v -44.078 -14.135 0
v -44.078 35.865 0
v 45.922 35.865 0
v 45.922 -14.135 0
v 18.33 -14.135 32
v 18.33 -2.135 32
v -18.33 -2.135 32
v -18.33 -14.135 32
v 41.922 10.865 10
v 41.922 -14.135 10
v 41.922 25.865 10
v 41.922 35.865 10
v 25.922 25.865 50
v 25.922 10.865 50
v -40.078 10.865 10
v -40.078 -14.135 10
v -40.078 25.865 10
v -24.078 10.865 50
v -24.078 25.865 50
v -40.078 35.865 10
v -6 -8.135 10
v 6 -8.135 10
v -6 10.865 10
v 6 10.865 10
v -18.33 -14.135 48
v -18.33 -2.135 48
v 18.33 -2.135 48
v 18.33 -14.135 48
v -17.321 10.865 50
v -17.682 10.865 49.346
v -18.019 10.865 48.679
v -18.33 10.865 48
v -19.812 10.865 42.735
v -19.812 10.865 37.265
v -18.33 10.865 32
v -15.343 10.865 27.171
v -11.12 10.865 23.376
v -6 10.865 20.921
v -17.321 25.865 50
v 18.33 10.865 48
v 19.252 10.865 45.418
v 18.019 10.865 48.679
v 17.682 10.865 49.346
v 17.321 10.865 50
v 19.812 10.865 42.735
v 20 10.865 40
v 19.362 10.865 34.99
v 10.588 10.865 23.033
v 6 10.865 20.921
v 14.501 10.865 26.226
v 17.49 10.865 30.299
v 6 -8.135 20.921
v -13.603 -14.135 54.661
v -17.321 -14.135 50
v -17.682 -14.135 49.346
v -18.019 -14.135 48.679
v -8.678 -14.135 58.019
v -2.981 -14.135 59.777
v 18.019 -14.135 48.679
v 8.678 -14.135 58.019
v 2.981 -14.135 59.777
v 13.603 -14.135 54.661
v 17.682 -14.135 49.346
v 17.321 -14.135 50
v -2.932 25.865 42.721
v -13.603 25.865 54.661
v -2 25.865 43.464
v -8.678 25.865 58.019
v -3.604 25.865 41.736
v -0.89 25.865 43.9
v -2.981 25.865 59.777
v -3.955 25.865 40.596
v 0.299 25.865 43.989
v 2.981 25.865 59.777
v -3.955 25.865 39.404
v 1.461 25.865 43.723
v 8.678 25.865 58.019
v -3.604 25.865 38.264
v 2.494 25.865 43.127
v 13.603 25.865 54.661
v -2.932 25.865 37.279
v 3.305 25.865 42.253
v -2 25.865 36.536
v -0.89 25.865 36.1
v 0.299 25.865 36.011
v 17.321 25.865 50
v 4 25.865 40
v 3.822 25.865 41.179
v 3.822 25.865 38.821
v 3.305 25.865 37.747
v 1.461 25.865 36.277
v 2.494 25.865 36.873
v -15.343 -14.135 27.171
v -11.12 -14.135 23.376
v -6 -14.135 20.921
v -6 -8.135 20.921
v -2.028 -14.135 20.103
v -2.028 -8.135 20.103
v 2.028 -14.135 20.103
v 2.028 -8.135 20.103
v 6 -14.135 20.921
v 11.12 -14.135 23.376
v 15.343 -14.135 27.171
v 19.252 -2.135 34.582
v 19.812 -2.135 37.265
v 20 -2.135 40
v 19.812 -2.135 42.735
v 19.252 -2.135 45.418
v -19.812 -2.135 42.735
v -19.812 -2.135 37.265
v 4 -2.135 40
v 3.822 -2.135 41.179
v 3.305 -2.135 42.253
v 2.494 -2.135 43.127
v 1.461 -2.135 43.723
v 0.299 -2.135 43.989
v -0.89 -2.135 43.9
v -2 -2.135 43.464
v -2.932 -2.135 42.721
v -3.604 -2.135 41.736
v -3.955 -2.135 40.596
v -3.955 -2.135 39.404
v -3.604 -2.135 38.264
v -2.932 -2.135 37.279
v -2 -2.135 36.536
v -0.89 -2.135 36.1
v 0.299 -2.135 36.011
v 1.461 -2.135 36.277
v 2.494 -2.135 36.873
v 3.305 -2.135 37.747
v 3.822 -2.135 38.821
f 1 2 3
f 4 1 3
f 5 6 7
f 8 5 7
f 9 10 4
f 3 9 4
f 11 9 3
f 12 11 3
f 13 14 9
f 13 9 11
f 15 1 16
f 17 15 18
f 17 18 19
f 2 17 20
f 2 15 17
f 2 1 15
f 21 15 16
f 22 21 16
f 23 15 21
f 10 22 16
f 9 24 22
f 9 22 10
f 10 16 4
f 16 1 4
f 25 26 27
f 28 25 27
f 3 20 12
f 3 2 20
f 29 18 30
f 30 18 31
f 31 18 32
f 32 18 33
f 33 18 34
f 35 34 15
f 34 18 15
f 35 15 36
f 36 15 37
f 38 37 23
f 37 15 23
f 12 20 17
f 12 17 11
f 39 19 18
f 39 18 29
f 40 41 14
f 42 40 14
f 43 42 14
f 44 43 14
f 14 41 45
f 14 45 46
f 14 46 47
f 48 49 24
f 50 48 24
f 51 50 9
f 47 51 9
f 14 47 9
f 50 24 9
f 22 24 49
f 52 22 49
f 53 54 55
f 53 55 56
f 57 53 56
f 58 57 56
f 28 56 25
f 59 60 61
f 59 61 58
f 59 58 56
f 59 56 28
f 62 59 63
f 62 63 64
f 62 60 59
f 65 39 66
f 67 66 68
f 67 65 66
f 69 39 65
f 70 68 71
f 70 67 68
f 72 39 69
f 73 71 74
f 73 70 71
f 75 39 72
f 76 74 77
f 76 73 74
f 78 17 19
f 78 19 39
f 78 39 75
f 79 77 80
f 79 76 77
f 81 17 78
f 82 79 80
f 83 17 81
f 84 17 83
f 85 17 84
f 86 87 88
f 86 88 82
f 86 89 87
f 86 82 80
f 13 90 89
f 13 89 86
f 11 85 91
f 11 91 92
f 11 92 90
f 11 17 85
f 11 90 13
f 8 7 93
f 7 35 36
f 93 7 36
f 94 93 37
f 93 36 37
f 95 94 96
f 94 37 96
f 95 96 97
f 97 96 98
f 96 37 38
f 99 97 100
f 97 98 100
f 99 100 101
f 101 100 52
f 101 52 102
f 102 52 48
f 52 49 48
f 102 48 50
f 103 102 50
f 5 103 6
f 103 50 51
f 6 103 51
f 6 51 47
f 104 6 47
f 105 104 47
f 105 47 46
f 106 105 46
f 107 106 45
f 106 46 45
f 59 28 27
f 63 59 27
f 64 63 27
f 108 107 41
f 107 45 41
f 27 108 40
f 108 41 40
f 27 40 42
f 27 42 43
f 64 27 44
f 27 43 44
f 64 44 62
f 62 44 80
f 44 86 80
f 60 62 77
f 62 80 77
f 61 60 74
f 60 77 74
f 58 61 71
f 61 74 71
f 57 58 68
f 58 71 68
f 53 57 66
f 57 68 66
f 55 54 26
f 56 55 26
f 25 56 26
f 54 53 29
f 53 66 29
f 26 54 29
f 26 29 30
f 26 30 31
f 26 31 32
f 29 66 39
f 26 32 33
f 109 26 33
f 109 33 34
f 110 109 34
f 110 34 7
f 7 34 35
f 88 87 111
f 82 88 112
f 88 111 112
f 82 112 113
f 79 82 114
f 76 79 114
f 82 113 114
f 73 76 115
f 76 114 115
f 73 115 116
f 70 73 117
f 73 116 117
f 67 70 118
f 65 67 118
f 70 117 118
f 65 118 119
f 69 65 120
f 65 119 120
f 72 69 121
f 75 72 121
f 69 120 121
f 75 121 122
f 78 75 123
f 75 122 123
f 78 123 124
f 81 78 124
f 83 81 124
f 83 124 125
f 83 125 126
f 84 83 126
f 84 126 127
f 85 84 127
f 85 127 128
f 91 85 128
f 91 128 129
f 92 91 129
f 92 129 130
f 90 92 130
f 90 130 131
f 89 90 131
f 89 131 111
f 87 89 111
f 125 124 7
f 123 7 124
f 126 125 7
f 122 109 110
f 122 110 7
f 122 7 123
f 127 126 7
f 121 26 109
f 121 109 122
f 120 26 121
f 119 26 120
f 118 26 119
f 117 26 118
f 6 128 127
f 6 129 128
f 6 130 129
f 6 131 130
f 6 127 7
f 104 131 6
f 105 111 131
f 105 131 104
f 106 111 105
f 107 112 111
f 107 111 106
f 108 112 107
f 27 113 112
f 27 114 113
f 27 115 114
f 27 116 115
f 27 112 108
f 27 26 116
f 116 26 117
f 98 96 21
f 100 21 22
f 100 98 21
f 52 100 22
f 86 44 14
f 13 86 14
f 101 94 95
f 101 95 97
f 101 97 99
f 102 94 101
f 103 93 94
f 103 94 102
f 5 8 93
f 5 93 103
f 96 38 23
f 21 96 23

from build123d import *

# Parameters (mm, degrees)
F0_W      = 90
F0_H      = 50
F1_DEPTH  = 10
F2_W      = 90
F2_H      = 15
F3_DEPTH  = 40
F4_SIZE2  = 49.99999
F4_SIZE   = 19.99999
F5_SIZE2  = 19.99999
F5_SIZE   = 49.99999
F7_DEPTH  = 25
F8_DEPTH  = 15
F9_DEPTH  = 13
F10_DEPTH = 19
F11_R     = 4
F12_DEPTH = 40


# Not quite as in the source:
# - a fillet or chamfer is up to 0.001 mm smaller than in the source, because OpenCascade refuses the exact size


with BuildPart() as f1:
    # F0 (on Top) → F1 (new body)
    with BuildSketch(Plane.XY):
        with Locations((0.9217737243, 10.8652876893)):
            Rectangle(F0_W, F0_H)
    extrude(amount=F1_DEPTH)

    # F2 (on face) → F3 (join)
    with BuildSketch(Plane.XY.offset(10)):
        with Locations((0.9217737243, 18.3652876893)):
            Rectangle(F2_W, F2_H)
    extrude(amount=F3_DEPTH)

    # F4 (size 20 and 50 in the source; OpenCascade refuses exactly that, so slightly less here)
    f4_edges = [f1.edges().sort_by_distance(p)[0] for p in [
        (-44.078226, 18.365288, 50),
    ]]
    f4_side = f1.faces().sort_by_distance((0.921774, 18.365288, 50))[0]
    chamfer(f4_edges, length=F4_SIZE, length2=F4_SIZE2, reference=f4_side)

    # F5 (size 50 and 20 in the source; OpenCascade refuses exactly that, so slightly less here)
    f5_edges = [f1.edges().sort_by_distance(p)[0] for p in [
        (45.921774, 18.365288, 50),
    ]]
    f5_side = f1.faces().sort_by_distance((45.921774, 14.956197, 18.636364))[0]
    chamfer(f5_edges, length=F5_SIZE, length2=F5_SIZE2, reference=f5_side)

    # F6 (on face) → F7 (join)
    with BuildSketch(Plane.XZ.offset(-10.8652876893)):
        with BuildLine():
            Line((-17.3205080757, 50), (17.3205080757, 50))
            ThreePointArc((17.3205080757, 50), (0, 60), (-17.3205080757, 50))
        make_face()
        with BuildLine():
            Line((-18.3303027798, 48), (18.3303027798, 48))
            ThreePointArc((18.3303027798, 48), (17.8534332458, 49.0141511711), (17.3205080757, 50))
            Line((17.3205080757, 50), (-17.3205080757, 50))
            ThreePointArc((-17.3205080757, 50), (-17.8534332458, 49.0141511711), (-18.3303027798, 48))
        make_face()
        with BuildLine():
            ThreePointArc((6, 20.9212159717), (13.3669657075, 25.1230302893), (18.3303027798, 32))
            Line((18.3303027798, 32), (-18.3303027798, 32))
            ThreePointArc((-18.3303027798, 32), (-13.3669657075, 25.1230302893), (-6, 20.9212159717))
            ThreePointArc((-6, 20.9212159717), (0, 20), (6, 20.9212159717))
        make_face()
    extrude(amount=F7_DEPTH)

    # F8 (add): a face of the model
    f8_faces = [f1.faces().sort_by_distance(p)[0] for p in [
        (0, 10.8652876893, 54.100403238),
    ]]
    extrude(f8_faces, amount=F8_DEPTH)

    # F6 (on face) → F9 (join)
    with BuildSketch(Plane.XZ.offset(-10.8652876893)):
        with BuildLine():
            ThreePointArc((18.3303027798, 32), (19.5781262586, 35.9138071262), (20, 40))
            ThreePointArc((20, 40), (19.5781262586, 44.0861928738), (18.3303027798, 48))
            Line((18.3303027798, 48), (-18.3303027798, 48))
            ThreePointArc((-18.3303027798, 48), (-20, 40), (-18.3303027798, 32))
            Line((-18.3303027798, 32), (18.3303027798, 32))
        make_face()
    extrude(amount=F9_DEPTH)

    # F6 (on face) → F10 (join)
    with BuildSketch(Plane.XZ.offset(-10.8652876893)):
        with BuildLine():
            Line((6, 10), (6, 20.9212159717))
            ThreePointArc((6, 20.9212159717), (0, 20), (-6, 20.9212159717))
            Line((-6, 20.9212159717), (-6, 10))
            Line((-6, 10), (6, 10))
        make_face()
    extrude(amount=F10_DEPTH)

    # F11 (on face) → F12 (cut)
    with BuildSketch(Plane.XZ.offset(2.1347123107)):
        with Locations((0, 40)):
            Circle(F11_R)
    extrude(amount=-F12_DEPTH, mode=Mode.SUBTRACT)


solid = f1.part
